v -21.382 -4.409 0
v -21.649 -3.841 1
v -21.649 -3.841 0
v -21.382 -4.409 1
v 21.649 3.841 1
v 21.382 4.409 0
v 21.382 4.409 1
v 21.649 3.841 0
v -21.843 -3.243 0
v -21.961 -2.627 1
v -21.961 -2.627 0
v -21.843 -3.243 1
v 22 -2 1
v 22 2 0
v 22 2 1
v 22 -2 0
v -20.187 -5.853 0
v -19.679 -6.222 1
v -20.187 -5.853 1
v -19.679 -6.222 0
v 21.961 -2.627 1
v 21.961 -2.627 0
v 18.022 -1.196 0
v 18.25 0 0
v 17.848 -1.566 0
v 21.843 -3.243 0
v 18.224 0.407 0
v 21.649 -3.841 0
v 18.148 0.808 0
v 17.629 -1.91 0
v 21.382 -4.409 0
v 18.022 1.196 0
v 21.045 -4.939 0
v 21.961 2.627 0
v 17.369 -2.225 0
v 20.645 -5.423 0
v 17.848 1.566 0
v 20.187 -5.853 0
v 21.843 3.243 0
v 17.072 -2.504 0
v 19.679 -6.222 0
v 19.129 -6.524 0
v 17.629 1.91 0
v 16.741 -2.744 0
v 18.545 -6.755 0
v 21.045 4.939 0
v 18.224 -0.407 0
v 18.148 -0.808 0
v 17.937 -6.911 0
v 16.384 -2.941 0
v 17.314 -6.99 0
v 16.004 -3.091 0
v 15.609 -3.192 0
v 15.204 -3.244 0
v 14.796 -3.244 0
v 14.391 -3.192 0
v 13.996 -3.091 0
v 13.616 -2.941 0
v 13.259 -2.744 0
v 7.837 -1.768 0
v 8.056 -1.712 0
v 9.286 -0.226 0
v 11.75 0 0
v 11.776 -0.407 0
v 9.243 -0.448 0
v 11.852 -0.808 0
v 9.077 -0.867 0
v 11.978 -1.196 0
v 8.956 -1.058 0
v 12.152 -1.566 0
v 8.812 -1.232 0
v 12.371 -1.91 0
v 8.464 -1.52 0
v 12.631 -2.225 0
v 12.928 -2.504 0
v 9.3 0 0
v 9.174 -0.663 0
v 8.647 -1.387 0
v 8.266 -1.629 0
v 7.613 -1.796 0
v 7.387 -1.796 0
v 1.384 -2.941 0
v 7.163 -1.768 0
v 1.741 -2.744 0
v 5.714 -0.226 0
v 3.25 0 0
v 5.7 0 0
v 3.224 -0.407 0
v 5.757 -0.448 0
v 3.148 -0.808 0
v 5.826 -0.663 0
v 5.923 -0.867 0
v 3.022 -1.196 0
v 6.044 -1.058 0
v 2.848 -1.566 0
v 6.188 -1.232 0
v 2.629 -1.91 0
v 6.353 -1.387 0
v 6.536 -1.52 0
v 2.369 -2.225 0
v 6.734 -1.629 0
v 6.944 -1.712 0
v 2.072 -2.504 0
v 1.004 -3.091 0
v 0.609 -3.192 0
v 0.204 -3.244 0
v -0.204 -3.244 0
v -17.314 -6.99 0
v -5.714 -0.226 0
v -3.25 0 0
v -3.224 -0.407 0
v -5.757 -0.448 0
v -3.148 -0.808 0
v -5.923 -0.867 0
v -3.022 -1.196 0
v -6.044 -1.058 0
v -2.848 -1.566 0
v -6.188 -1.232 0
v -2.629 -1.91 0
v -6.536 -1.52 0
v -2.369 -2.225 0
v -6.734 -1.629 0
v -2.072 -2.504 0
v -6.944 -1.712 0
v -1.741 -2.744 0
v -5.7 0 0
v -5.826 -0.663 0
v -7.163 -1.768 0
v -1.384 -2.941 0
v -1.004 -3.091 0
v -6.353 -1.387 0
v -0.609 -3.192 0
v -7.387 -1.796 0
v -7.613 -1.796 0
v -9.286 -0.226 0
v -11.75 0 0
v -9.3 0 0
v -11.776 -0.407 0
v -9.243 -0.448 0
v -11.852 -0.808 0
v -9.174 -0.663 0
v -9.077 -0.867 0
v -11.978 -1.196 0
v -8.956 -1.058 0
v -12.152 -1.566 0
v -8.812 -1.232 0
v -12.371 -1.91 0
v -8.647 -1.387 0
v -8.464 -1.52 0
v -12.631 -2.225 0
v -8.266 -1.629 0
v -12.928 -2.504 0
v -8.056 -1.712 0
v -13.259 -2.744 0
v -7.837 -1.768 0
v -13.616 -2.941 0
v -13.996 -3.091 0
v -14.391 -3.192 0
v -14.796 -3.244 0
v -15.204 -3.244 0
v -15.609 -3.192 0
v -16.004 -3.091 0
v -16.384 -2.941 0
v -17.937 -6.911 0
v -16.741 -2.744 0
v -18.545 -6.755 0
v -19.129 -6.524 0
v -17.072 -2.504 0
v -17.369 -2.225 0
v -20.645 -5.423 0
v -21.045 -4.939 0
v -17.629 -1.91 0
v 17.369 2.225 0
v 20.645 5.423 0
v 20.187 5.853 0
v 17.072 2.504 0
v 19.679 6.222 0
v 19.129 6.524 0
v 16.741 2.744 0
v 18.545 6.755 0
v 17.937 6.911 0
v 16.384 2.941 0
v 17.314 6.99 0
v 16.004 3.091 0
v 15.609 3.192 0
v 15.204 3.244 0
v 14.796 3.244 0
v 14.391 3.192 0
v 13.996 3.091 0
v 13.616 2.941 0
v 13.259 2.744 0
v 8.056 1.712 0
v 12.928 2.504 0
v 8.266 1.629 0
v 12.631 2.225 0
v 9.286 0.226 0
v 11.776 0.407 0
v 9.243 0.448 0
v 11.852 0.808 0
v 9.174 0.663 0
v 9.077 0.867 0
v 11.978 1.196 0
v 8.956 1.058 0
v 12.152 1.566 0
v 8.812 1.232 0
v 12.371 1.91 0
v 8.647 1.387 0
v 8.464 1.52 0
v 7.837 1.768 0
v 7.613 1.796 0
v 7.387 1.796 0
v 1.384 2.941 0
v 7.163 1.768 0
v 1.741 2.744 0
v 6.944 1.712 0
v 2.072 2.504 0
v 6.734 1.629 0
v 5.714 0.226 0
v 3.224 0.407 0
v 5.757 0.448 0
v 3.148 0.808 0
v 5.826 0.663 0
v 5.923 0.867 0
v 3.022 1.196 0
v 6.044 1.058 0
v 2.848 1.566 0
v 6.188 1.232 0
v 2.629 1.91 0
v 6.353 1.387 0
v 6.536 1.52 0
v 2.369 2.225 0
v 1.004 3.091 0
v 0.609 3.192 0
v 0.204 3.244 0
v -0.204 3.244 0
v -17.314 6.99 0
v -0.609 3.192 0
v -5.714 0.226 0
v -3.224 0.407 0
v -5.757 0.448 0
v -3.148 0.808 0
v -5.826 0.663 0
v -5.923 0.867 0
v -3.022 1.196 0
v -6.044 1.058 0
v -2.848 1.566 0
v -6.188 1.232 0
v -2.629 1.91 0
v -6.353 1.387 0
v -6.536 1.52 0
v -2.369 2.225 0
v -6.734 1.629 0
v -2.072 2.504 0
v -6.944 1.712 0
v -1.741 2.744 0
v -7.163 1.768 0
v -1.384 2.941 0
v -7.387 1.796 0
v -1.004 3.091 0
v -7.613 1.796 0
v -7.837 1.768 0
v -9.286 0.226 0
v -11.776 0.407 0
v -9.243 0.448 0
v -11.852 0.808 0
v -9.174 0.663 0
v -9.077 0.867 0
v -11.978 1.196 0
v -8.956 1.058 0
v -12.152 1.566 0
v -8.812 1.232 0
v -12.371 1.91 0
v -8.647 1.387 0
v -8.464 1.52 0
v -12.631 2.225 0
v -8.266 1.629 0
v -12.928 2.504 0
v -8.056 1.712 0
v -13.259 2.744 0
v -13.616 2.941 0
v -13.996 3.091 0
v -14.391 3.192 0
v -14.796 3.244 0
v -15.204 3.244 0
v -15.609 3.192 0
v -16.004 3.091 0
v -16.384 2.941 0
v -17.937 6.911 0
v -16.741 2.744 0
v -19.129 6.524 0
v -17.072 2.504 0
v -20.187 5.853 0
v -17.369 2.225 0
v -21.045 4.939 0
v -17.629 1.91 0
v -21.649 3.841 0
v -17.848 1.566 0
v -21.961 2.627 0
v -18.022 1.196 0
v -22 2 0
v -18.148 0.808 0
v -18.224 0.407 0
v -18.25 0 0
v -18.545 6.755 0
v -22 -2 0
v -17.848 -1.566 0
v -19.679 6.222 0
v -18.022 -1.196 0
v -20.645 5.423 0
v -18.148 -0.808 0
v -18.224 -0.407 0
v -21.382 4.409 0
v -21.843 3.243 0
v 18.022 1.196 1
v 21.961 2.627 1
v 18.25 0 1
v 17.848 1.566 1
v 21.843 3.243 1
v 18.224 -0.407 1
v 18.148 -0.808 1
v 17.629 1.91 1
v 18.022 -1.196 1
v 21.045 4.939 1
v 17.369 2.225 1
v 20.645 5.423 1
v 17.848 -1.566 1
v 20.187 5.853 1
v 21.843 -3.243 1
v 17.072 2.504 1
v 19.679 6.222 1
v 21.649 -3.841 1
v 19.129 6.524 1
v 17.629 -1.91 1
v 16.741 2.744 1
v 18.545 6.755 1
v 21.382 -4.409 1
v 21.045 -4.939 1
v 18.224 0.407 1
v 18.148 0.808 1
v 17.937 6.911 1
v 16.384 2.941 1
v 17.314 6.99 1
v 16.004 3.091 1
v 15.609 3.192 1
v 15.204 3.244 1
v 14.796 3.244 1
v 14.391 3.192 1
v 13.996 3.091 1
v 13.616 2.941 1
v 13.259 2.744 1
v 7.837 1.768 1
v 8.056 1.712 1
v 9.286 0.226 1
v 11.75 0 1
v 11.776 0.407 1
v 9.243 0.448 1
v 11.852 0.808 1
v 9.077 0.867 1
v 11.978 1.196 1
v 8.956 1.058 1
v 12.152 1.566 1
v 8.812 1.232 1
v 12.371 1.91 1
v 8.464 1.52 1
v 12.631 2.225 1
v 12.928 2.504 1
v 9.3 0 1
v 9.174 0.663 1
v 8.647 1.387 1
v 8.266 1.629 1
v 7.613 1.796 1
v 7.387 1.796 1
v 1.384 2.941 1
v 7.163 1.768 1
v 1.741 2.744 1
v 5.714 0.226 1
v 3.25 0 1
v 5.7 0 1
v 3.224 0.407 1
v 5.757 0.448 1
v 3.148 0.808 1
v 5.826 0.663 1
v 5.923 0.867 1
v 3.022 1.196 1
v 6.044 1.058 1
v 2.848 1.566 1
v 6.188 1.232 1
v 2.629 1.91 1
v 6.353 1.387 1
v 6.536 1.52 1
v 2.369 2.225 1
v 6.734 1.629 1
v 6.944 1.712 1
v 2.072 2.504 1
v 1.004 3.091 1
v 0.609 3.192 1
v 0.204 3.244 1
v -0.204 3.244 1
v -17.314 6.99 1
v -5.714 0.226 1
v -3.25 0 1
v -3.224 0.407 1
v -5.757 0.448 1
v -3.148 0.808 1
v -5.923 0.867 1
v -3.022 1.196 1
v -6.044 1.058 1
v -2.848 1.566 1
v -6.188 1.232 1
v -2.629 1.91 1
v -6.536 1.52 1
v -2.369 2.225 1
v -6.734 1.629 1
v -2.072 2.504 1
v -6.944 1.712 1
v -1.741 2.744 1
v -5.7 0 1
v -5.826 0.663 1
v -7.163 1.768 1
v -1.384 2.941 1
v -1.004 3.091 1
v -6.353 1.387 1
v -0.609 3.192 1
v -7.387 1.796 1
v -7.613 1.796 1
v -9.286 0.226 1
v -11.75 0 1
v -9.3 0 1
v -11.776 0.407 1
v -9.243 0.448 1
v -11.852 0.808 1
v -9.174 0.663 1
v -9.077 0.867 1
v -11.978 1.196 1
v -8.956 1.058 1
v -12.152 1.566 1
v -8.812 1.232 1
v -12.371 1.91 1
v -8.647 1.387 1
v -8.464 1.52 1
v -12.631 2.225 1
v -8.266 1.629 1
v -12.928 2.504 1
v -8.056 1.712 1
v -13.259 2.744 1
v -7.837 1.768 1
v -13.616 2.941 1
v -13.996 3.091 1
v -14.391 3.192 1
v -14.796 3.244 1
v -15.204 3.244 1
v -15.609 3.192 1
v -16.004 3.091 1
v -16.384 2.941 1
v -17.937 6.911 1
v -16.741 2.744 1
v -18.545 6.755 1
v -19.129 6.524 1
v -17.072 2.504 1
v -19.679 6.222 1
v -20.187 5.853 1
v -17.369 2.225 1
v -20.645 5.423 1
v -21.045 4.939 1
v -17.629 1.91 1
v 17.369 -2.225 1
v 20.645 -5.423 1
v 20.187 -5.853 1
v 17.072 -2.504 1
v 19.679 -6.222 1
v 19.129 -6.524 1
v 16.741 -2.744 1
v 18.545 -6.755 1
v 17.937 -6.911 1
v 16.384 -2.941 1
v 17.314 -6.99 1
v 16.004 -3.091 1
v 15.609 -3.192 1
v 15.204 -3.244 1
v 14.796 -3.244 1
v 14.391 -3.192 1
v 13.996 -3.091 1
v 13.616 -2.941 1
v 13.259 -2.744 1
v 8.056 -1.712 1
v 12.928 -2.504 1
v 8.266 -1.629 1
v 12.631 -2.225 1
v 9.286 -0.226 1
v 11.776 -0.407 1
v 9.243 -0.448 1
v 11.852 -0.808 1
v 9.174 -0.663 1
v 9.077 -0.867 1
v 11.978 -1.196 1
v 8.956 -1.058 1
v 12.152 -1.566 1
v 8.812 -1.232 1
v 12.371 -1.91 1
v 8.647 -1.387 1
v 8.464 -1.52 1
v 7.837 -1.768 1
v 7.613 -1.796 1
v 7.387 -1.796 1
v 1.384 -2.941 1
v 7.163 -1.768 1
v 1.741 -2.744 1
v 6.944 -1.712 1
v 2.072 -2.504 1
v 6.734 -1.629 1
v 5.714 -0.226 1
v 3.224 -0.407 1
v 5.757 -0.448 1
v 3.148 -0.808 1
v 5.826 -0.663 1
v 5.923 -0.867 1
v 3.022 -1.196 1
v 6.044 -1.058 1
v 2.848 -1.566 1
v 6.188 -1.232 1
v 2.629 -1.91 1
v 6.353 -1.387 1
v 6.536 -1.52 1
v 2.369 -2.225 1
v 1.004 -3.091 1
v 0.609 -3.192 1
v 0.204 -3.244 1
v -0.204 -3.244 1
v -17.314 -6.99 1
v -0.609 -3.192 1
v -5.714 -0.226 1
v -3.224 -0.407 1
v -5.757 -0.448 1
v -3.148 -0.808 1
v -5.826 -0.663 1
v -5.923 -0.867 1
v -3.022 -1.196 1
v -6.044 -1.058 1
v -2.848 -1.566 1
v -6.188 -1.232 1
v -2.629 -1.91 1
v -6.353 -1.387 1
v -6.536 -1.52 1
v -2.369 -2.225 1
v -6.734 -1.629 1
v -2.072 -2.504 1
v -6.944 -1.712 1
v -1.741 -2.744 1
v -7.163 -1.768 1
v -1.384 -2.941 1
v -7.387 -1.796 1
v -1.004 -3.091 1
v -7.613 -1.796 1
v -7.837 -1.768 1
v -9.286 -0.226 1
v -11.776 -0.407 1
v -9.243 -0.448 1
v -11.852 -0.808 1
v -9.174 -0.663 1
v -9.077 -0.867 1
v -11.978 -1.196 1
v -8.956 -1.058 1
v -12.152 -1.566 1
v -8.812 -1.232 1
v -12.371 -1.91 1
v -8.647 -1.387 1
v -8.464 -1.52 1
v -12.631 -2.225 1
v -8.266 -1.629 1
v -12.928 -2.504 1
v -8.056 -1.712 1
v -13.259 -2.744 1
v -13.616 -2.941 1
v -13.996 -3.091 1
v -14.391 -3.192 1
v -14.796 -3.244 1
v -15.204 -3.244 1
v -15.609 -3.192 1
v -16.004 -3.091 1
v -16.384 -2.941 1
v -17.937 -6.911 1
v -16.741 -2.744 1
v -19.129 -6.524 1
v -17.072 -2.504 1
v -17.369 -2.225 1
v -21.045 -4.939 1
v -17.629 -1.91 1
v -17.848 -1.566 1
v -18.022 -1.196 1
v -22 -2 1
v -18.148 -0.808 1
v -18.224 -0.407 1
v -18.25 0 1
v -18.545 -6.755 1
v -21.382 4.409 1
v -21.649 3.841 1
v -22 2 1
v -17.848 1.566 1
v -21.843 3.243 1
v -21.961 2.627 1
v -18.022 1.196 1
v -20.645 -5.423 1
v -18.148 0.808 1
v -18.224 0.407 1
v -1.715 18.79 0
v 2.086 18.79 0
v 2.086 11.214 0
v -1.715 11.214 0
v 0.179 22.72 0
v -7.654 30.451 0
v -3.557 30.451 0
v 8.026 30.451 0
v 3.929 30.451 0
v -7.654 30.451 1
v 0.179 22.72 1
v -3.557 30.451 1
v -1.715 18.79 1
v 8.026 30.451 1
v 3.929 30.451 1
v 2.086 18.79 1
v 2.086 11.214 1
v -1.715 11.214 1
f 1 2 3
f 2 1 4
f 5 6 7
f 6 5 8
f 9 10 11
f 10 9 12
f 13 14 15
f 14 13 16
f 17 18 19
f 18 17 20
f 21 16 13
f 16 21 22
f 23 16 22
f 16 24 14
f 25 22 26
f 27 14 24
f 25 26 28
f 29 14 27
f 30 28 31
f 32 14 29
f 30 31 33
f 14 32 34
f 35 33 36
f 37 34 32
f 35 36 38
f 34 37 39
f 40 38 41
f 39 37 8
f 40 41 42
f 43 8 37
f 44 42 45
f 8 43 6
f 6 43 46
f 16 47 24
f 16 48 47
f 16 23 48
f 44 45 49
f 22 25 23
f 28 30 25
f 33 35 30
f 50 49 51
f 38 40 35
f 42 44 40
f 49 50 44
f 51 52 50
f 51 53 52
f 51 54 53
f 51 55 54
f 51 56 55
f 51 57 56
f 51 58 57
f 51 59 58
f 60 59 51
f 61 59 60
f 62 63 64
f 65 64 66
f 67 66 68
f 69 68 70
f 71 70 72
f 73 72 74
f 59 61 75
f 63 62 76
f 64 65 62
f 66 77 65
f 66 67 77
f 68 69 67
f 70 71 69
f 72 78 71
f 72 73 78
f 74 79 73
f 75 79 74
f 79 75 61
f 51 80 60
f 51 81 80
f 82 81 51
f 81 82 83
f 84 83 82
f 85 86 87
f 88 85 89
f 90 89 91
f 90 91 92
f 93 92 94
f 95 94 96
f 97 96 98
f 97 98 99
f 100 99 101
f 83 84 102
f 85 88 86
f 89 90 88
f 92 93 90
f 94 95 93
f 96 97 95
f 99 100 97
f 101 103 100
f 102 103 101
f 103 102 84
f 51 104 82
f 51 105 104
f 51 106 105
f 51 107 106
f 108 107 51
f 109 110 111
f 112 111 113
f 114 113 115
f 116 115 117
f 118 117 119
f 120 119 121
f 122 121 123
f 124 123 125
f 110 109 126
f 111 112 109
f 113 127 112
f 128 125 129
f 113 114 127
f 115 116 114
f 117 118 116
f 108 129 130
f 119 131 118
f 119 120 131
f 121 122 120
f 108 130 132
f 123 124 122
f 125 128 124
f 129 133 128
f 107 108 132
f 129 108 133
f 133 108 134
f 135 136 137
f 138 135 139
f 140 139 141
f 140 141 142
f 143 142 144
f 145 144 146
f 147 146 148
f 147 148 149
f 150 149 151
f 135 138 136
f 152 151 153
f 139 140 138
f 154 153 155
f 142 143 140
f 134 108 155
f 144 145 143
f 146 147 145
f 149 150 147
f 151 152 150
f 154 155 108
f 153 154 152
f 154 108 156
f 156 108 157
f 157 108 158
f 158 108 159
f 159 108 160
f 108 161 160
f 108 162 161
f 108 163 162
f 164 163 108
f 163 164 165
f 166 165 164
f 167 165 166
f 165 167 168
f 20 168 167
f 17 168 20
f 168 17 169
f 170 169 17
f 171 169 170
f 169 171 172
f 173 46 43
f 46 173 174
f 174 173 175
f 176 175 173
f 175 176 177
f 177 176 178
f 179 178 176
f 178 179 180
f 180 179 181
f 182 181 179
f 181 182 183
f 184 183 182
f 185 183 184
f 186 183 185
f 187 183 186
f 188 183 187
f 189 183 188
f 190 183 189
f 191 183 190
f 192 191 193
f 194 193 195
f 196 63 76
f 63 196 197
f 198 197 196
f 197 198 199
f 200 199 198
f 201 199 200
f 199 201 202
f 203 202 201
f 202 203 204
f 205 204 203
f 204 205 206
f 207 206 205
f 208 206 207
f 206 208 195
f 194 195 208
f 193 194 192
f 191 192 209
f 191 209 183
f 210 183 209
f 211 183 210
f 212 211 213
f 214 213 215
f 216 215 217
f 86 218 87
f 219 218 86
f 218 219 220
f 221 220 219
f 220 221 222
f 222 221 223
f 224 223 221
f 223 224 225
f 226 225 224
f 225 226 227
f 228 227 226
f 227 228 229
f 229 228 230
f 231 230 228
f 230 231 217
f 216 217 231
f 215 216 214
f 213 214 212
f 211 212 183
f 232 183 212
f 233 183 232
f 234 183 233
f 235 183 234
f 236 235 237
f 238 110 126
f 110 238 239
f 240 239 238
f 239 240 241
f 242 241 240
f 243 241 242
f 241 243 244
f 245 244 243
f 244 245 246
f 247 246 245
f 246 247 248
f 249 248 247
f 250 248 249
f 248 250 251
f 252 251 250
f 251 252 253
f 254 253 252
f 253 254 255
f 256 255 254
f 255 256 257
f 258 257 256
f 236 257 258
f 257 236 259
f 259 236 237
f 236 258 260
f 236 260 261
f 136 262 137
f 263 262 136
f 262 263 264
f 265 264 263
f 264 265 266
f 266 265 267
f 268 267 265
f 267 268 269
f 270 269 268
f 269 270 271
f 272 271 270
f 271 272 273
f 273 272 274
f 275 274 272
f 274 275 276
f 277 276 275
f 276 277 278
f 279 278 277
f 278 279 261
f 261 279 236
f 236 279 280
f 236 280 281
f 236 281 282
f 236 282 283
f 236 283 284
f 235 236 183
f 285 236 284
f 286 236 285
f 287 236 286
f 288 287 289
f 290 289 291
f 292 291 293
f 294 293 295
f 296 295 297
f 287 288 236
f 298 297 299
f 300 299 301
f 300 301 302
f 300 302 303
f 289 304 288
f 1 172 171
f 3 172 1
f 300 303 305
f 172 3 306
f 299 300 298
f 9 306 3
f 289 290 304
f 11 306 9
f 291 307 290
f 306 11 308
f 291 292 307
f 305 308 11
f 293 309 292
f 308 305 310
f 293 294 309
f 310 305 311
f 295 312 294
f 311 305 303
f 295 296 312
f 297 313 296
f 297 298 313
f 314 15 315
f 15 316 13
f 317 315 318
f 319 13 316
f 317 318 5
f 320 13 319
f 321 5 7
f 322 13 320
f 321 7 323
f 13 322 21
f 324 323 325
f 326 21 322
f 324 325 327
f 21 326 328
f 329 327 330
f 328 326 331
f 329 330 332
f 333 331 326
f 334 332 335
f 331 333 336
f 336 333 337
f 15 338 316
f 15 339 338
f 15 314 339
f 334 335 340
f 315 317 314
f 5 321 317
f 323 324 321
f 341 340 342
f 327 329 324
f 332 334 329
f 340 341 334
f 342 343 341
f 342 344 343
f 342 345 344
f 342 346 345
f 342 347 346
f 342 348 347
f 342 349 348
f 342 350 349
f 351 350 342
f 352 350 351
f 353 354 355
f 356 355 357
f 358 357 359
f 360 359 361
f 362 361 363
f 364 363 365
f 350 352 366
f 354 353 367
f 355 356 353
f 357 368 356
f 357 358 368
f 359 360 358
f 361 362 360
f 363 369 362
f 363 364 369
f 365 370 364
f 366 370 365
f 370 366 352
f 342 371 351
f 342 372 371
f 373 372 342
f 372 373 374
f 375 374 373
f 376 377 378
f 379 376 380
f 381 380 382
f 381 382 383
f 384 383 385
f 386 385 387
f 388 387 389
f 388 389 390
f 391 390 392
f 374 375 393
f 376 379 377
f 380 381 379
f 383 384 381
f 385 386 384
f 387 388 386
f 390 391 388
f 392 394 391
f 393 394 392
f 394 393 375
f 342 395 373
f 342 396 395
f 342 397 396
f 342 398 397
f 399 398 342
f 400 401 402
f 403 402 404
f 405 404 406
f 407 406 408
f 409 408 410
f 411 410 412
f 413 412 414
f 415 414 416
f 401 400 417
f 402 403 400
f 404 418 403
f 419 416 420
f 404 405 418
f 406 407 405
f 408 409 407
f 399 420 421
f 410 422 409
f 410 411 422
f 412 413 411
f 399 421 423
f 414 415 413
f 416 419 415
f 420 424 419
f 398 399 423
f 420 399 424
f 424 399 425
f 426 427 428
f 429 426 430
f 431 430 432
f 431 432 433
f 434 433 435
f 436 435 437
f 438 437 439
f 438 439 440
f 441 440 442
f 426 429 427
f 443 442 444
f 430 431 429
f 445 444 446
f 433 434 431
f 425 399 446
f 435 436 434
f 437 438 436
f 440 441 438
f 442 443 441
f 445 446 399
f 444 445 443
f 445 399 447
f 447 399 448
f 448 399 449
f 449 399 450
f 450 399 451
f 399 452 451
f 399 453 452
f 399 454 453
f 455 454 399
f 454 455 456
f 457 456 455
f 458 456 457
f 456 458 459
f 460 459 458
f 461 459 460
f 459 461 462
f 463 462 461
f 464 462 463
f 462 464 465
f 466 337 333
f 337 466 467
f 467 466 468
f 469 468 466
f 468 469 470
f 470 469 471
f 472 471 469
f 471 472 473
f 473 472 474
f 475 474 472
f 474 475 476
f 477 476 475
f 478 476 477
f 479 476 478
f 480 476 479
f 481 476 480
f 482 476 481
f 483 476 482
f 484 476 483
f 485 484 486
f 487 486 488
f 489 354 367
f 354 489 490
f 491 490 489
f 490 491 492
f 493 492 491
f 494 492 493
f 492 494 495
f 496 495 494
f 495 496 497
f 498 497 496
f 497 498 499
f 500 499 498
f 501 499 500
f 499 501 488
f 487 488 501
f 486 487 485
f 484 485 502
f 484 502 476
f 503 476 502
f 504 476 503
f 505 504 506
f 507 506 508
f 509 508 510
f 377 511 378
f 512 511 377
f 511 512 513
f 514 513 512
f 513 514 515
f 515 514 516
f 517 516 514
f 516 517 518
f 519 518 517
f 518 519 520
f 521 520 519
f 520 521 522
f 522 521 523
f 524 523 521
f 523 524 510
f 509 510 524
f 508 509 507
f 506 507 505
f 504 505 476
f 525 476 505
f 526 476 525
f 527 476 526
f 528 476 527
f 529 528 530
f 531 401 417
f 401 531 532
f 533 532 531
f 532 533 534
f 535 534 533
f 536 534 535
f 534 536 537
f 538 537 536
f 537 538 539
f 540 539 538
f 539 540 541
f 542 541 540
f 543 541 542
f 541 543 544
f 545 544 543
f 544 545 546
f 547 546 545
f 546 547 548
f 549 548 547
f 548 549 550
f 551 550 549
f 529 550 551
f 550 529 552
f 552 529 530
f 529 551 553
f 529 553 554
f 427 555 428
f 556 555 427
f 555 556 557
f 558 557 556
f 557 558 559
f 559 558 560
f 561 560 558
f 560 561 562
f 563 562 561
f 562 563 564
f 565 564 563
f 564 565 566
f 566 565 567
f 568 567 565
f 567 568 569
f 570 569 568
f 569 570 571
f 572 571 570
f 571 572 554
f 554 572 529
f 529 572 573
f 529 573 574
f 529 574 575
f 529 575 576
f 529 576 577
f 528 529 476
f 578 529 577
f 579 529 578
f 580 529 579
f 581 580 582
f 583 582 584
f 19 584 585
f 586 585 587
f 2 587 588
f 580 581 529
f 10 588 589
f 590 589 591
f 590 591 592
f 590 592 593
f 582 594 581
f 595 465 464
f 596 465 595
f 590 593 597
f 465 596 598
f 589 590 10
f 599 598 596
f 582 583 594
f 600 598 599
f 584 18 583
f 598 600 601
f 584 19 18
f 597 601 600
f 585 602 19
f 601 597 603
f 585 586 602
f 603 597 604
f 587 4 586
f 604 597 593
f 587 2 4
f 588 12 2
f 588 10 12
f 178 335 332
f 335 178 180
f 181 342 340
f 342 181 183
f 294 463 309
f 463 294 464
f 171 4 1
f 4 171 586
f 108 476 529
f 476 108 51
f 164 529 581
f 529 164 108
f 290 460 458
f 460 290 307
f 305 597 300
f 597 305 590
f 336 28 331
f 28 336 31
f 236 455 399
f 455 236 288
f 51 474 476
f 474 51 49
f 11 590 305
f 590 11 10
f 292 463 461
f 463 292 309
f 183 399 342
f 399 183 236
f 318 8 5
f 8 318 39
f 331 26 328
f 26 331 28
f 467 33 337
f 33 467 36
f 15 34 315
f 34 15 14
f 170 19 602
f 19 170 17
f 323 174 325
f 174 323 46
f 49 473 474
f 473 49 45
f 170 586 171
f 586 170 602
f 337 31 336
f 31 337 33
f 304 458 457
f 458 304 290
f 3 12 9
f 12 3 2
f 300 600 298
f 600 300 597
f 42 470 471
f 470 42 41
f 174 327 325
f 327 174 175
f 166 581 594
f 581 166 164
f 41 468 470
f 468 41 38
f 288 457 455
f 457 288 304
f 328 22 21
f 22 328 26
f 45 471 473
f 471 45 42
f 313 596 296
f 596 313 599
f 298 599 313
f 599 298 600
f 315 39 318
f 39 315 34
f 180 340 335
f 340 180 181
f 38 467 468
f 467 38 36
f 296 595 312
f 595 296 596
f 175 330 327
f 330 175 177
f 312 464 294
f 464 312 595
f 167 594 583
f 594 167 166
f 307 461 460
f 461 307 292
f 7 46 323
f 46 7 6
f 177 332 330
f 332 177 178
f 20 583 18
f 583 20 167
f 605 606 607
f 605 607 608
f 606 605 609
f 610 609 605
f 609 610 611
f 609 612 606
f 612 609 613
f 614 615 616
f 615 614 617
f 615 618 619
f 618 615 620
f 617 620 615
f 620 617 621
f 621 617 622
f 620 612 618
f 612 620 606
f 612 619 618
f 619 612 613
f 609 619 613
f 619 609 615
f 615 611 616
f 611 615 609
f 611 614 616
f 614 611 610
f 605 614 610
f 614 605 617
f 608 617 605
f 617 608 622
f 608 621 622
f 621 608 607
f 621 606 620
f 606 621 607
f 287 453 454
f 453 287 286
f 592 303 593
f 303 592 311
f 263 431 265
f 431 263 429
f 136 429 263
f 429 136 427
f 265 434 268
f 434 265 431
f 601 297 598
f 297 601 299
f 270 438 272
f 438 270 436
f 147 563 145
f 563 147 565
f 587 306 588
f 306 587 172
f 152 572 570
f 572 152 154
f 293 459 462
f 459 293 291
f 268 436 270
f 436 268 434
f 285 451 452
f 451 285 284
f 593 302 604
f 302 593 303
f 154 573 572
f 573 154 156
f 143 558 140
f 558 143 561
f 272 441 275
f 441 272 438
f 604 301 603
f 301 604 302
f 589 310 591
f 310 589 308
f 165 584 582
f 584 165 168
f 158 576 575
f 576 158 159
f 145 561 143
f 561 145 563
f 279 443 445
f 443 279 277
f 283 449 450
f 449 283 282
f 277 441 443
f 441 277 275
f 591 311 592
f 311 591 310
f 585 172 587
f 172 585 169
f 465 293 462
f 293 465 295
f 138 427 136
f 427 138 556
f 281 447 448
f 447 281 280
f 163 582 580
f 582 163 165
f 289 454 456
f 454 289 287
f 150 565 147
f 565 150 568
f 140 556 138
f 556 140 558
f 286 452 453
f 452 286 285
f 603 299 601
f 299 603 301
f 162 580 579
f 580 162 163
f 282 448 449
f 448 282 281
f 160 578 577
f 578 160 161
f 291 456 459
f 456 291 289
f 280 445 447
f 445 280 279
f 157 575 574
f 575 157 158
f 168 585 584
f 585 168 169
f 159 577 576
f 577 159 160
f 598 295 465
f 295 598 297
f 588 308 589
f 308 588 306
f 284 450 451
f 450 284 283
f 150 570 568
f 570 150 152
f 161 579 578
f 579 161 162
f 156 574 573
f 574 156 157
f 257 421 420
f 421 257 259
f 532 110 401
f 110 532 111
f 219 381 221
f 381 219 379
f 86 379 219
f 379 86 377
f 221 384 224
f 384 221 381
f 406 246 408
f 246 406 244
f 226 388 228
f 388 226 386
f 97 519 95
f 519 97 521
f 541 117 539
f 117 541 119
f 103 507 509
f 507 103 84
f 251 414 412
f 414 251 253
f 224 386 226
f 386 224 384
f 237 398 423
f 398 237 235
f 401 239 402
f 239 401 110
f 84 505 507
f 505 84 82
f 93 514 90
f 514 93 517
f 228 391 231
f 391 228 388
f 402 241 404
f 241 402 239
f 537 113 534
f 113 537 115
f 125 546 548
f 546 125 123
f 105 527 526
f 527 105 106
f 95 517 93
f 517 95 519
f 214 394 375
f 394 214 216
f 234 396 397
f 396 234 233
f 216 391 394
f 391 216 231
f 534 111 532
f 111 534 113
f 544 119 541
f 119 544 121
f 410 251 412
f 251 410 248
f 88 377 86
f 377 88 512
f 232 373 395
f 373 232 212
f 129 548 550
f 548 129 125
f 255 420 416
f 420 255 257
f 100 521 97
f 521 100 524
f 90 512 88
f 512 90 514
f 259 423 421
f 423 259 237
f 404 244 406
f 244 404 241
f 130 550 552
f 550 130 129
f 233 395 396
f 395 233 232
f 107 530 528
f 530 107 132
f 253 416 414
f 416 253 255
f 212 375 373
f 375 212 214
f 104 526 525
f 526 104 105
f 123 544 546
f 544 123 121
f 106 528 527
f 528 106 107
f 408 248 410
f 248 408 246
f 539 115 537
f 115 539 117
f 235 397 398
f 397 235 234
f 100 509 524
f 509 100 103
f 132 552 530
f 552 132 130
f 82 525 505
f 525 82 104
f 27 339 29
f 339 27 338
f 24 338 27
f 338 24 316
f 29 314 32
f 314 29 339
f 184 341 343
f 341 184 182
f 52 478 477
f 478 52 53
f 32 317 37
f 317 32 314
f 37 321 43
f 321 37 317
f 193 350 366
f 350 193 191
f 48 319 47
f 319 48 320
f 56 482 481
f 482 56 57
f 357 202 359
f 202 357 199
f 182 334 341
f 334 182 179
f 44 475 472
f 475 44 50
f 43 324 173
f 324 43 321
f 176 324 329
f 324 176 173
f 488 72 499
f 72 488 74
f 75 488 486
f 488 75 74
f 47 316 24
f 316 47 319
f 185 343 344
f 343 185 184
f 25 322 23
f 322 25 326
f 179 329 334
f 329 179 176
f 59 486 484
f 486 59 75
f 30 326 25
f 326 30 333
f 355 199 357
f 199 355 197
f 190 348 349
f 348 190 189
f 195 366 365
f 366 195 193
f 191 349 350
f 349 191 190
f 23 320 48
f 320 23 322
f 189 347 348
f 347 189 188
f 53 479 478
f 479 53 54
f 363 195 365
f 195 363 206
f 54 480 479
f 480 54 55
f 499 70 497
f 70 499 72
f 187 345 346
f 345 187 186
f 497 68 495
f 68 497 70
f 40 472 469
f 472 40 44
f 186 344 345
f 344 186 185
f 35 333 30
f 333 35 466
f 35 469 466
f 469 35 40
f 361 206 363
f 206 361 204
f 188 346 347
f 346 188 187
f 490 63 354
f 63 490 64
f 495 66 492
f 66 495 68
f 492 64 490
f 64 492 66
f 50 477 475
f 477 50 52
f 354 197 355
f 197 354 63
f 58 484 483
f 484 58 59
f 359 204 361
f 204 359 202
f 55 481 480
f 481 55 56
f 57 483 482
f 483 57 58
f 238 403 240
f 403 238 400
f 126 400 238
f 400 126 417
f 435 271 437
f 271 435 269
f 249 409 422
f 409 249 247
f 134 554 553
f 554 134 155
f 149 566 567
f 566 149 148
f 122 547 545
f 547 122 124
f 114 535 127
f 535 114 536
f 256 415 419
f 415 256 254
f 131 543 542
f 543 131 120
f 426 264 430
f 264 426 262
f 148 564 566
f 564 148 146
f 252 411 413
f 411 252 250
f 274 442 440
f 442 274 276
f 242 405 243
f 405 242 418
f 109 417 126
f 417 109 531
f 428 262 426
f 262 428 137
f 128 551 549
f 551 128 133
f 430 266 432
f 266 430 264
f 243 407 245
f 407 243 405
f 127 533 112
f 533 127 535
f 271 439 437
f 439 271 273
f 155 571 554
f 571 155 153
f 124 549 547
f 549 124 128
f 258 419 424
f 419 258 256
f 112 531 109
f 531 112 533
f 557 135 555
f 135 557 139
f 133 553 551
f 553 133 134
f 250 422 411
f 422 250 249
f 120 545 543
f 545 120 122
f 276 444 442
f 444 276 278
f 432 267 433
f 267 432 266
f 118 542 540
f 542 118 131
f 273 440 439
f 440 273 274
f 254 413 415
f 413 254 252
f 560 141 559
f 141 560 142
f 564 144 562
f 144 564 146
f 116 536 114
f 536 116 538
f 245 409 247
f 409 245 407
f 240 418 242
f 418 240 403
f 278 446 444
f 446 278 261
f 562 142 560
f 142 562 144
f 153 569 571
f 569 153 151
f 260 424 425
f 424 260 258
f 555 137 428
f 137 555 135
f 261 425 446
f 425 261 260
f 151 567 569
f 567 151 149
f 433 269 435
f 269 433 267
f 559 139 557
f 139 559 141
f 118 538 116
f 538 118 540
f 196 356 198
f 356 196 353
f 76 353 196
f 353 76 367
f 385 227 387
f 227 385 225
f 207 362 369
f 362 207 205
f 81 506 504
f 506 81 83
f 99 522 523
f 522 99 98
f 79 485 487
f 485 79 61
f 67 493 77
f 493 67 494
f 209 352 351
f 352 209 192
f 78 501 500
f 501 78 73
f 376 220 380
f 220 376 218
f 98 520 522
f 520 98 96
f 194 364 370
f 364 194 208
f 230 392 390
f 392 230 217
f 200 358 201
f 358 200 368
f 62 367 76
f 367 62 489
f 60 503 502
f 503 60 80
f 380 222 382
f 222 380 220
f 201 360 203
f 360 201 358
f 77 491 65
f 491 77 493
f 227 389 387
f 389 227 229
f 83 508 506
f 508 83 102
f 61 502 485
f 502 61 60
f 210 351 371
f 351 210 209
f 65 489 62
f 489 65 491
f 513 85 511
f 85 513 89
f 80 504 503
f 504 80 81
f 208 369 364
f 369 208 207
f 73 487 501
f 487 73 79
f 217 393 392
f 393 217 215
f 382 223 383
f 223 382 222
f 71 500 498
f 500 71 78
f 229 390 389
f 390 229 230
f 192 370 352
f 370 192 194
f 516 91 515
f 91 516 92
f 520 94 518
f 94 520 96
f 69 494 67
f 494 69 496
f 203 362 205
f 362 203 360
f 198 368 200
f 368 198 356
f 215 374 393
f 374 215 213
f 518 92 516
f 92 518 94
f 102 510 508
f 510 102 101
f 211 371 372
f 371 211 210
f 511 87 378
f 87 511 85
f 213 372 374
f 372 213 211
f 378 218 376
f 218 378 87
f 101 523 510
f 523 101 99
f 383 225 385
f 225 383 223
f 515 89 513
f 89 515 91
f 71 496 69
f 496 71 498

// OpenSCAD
$fn = 50;


difference() {
	union() {
		hull() {
			translate(v = [-17.0000000000, 2.0000000000, 0]) {
				cylinder(h = 1, r = 5);
			}
			translate(v = [17.0000000000, 2.0000000000, 0]) {
				cylinder(h = 1, r = 5);
			}
			translate(v = [-17.0000000000, -2.0000000000, 0]) {
				cylinder(h = 1, r = 5);
			}
			translate(v = [17.0000000000, -2.0000000000, 0]) {
				cylinder(h = 1, r = 5);
			}
		}
		translate(v = [0, 30.0000000000, 0]) {
			linear_extrude(height = 1) {
				text(font = "DejaVu Sans Mono:style=Bold", halign = "center", size = 19.0000000000, text = "Y", valign = "top");
			}
		}
	}
	union() {
		translate(v = [-15.0000000000, 0.0000000000, 0]) {
			translate(v = [0, 0, -100]) {
				cylinder(h = 200, r = 3.2500000000);
			}
		}
		translate(v = [0, 0, -100]) {
			cylinder(h = 200, r = 3.2500000000);
		}
		translate(v = [15.0000000000, 0.0000000000, 0]) {
			translate(v = [0, 0, -100]) {
				cylinder(h = 200, r = 3.2500000000);
			}
		}
		translate(v = [-15.0000000000, 0.0000000000, 0]) {
			translate(v = [0, 0, -100]) {
				cylinder(h = 200, r = 1.8000000000);
			}
		}
		translate(v = [-7.5000000000, 0.0000000000, 0]) {
			translate(v = [0, 0, -100]) {
				cylinder(h = 200, r = 1.8000000000);
			}
		}
		translate(v = [0, 0, -100]) {
			cylinder(h = 200, r = 1.8000000000);
		}
		translate(v = [7.5000000000, 0.0000000000, 0]) {
			translate(v = [0, 0, -100]) {
				cylinder(h = 200, r = 1.8000000000);
			}
		}
		translate(v = [15.0000000000, 0.0000000000, 0]) {
			translate(v = [0, 0, -100]) {
				cylinder(h = 200, r = 1.8000000000);
			}
		}
	}
}
